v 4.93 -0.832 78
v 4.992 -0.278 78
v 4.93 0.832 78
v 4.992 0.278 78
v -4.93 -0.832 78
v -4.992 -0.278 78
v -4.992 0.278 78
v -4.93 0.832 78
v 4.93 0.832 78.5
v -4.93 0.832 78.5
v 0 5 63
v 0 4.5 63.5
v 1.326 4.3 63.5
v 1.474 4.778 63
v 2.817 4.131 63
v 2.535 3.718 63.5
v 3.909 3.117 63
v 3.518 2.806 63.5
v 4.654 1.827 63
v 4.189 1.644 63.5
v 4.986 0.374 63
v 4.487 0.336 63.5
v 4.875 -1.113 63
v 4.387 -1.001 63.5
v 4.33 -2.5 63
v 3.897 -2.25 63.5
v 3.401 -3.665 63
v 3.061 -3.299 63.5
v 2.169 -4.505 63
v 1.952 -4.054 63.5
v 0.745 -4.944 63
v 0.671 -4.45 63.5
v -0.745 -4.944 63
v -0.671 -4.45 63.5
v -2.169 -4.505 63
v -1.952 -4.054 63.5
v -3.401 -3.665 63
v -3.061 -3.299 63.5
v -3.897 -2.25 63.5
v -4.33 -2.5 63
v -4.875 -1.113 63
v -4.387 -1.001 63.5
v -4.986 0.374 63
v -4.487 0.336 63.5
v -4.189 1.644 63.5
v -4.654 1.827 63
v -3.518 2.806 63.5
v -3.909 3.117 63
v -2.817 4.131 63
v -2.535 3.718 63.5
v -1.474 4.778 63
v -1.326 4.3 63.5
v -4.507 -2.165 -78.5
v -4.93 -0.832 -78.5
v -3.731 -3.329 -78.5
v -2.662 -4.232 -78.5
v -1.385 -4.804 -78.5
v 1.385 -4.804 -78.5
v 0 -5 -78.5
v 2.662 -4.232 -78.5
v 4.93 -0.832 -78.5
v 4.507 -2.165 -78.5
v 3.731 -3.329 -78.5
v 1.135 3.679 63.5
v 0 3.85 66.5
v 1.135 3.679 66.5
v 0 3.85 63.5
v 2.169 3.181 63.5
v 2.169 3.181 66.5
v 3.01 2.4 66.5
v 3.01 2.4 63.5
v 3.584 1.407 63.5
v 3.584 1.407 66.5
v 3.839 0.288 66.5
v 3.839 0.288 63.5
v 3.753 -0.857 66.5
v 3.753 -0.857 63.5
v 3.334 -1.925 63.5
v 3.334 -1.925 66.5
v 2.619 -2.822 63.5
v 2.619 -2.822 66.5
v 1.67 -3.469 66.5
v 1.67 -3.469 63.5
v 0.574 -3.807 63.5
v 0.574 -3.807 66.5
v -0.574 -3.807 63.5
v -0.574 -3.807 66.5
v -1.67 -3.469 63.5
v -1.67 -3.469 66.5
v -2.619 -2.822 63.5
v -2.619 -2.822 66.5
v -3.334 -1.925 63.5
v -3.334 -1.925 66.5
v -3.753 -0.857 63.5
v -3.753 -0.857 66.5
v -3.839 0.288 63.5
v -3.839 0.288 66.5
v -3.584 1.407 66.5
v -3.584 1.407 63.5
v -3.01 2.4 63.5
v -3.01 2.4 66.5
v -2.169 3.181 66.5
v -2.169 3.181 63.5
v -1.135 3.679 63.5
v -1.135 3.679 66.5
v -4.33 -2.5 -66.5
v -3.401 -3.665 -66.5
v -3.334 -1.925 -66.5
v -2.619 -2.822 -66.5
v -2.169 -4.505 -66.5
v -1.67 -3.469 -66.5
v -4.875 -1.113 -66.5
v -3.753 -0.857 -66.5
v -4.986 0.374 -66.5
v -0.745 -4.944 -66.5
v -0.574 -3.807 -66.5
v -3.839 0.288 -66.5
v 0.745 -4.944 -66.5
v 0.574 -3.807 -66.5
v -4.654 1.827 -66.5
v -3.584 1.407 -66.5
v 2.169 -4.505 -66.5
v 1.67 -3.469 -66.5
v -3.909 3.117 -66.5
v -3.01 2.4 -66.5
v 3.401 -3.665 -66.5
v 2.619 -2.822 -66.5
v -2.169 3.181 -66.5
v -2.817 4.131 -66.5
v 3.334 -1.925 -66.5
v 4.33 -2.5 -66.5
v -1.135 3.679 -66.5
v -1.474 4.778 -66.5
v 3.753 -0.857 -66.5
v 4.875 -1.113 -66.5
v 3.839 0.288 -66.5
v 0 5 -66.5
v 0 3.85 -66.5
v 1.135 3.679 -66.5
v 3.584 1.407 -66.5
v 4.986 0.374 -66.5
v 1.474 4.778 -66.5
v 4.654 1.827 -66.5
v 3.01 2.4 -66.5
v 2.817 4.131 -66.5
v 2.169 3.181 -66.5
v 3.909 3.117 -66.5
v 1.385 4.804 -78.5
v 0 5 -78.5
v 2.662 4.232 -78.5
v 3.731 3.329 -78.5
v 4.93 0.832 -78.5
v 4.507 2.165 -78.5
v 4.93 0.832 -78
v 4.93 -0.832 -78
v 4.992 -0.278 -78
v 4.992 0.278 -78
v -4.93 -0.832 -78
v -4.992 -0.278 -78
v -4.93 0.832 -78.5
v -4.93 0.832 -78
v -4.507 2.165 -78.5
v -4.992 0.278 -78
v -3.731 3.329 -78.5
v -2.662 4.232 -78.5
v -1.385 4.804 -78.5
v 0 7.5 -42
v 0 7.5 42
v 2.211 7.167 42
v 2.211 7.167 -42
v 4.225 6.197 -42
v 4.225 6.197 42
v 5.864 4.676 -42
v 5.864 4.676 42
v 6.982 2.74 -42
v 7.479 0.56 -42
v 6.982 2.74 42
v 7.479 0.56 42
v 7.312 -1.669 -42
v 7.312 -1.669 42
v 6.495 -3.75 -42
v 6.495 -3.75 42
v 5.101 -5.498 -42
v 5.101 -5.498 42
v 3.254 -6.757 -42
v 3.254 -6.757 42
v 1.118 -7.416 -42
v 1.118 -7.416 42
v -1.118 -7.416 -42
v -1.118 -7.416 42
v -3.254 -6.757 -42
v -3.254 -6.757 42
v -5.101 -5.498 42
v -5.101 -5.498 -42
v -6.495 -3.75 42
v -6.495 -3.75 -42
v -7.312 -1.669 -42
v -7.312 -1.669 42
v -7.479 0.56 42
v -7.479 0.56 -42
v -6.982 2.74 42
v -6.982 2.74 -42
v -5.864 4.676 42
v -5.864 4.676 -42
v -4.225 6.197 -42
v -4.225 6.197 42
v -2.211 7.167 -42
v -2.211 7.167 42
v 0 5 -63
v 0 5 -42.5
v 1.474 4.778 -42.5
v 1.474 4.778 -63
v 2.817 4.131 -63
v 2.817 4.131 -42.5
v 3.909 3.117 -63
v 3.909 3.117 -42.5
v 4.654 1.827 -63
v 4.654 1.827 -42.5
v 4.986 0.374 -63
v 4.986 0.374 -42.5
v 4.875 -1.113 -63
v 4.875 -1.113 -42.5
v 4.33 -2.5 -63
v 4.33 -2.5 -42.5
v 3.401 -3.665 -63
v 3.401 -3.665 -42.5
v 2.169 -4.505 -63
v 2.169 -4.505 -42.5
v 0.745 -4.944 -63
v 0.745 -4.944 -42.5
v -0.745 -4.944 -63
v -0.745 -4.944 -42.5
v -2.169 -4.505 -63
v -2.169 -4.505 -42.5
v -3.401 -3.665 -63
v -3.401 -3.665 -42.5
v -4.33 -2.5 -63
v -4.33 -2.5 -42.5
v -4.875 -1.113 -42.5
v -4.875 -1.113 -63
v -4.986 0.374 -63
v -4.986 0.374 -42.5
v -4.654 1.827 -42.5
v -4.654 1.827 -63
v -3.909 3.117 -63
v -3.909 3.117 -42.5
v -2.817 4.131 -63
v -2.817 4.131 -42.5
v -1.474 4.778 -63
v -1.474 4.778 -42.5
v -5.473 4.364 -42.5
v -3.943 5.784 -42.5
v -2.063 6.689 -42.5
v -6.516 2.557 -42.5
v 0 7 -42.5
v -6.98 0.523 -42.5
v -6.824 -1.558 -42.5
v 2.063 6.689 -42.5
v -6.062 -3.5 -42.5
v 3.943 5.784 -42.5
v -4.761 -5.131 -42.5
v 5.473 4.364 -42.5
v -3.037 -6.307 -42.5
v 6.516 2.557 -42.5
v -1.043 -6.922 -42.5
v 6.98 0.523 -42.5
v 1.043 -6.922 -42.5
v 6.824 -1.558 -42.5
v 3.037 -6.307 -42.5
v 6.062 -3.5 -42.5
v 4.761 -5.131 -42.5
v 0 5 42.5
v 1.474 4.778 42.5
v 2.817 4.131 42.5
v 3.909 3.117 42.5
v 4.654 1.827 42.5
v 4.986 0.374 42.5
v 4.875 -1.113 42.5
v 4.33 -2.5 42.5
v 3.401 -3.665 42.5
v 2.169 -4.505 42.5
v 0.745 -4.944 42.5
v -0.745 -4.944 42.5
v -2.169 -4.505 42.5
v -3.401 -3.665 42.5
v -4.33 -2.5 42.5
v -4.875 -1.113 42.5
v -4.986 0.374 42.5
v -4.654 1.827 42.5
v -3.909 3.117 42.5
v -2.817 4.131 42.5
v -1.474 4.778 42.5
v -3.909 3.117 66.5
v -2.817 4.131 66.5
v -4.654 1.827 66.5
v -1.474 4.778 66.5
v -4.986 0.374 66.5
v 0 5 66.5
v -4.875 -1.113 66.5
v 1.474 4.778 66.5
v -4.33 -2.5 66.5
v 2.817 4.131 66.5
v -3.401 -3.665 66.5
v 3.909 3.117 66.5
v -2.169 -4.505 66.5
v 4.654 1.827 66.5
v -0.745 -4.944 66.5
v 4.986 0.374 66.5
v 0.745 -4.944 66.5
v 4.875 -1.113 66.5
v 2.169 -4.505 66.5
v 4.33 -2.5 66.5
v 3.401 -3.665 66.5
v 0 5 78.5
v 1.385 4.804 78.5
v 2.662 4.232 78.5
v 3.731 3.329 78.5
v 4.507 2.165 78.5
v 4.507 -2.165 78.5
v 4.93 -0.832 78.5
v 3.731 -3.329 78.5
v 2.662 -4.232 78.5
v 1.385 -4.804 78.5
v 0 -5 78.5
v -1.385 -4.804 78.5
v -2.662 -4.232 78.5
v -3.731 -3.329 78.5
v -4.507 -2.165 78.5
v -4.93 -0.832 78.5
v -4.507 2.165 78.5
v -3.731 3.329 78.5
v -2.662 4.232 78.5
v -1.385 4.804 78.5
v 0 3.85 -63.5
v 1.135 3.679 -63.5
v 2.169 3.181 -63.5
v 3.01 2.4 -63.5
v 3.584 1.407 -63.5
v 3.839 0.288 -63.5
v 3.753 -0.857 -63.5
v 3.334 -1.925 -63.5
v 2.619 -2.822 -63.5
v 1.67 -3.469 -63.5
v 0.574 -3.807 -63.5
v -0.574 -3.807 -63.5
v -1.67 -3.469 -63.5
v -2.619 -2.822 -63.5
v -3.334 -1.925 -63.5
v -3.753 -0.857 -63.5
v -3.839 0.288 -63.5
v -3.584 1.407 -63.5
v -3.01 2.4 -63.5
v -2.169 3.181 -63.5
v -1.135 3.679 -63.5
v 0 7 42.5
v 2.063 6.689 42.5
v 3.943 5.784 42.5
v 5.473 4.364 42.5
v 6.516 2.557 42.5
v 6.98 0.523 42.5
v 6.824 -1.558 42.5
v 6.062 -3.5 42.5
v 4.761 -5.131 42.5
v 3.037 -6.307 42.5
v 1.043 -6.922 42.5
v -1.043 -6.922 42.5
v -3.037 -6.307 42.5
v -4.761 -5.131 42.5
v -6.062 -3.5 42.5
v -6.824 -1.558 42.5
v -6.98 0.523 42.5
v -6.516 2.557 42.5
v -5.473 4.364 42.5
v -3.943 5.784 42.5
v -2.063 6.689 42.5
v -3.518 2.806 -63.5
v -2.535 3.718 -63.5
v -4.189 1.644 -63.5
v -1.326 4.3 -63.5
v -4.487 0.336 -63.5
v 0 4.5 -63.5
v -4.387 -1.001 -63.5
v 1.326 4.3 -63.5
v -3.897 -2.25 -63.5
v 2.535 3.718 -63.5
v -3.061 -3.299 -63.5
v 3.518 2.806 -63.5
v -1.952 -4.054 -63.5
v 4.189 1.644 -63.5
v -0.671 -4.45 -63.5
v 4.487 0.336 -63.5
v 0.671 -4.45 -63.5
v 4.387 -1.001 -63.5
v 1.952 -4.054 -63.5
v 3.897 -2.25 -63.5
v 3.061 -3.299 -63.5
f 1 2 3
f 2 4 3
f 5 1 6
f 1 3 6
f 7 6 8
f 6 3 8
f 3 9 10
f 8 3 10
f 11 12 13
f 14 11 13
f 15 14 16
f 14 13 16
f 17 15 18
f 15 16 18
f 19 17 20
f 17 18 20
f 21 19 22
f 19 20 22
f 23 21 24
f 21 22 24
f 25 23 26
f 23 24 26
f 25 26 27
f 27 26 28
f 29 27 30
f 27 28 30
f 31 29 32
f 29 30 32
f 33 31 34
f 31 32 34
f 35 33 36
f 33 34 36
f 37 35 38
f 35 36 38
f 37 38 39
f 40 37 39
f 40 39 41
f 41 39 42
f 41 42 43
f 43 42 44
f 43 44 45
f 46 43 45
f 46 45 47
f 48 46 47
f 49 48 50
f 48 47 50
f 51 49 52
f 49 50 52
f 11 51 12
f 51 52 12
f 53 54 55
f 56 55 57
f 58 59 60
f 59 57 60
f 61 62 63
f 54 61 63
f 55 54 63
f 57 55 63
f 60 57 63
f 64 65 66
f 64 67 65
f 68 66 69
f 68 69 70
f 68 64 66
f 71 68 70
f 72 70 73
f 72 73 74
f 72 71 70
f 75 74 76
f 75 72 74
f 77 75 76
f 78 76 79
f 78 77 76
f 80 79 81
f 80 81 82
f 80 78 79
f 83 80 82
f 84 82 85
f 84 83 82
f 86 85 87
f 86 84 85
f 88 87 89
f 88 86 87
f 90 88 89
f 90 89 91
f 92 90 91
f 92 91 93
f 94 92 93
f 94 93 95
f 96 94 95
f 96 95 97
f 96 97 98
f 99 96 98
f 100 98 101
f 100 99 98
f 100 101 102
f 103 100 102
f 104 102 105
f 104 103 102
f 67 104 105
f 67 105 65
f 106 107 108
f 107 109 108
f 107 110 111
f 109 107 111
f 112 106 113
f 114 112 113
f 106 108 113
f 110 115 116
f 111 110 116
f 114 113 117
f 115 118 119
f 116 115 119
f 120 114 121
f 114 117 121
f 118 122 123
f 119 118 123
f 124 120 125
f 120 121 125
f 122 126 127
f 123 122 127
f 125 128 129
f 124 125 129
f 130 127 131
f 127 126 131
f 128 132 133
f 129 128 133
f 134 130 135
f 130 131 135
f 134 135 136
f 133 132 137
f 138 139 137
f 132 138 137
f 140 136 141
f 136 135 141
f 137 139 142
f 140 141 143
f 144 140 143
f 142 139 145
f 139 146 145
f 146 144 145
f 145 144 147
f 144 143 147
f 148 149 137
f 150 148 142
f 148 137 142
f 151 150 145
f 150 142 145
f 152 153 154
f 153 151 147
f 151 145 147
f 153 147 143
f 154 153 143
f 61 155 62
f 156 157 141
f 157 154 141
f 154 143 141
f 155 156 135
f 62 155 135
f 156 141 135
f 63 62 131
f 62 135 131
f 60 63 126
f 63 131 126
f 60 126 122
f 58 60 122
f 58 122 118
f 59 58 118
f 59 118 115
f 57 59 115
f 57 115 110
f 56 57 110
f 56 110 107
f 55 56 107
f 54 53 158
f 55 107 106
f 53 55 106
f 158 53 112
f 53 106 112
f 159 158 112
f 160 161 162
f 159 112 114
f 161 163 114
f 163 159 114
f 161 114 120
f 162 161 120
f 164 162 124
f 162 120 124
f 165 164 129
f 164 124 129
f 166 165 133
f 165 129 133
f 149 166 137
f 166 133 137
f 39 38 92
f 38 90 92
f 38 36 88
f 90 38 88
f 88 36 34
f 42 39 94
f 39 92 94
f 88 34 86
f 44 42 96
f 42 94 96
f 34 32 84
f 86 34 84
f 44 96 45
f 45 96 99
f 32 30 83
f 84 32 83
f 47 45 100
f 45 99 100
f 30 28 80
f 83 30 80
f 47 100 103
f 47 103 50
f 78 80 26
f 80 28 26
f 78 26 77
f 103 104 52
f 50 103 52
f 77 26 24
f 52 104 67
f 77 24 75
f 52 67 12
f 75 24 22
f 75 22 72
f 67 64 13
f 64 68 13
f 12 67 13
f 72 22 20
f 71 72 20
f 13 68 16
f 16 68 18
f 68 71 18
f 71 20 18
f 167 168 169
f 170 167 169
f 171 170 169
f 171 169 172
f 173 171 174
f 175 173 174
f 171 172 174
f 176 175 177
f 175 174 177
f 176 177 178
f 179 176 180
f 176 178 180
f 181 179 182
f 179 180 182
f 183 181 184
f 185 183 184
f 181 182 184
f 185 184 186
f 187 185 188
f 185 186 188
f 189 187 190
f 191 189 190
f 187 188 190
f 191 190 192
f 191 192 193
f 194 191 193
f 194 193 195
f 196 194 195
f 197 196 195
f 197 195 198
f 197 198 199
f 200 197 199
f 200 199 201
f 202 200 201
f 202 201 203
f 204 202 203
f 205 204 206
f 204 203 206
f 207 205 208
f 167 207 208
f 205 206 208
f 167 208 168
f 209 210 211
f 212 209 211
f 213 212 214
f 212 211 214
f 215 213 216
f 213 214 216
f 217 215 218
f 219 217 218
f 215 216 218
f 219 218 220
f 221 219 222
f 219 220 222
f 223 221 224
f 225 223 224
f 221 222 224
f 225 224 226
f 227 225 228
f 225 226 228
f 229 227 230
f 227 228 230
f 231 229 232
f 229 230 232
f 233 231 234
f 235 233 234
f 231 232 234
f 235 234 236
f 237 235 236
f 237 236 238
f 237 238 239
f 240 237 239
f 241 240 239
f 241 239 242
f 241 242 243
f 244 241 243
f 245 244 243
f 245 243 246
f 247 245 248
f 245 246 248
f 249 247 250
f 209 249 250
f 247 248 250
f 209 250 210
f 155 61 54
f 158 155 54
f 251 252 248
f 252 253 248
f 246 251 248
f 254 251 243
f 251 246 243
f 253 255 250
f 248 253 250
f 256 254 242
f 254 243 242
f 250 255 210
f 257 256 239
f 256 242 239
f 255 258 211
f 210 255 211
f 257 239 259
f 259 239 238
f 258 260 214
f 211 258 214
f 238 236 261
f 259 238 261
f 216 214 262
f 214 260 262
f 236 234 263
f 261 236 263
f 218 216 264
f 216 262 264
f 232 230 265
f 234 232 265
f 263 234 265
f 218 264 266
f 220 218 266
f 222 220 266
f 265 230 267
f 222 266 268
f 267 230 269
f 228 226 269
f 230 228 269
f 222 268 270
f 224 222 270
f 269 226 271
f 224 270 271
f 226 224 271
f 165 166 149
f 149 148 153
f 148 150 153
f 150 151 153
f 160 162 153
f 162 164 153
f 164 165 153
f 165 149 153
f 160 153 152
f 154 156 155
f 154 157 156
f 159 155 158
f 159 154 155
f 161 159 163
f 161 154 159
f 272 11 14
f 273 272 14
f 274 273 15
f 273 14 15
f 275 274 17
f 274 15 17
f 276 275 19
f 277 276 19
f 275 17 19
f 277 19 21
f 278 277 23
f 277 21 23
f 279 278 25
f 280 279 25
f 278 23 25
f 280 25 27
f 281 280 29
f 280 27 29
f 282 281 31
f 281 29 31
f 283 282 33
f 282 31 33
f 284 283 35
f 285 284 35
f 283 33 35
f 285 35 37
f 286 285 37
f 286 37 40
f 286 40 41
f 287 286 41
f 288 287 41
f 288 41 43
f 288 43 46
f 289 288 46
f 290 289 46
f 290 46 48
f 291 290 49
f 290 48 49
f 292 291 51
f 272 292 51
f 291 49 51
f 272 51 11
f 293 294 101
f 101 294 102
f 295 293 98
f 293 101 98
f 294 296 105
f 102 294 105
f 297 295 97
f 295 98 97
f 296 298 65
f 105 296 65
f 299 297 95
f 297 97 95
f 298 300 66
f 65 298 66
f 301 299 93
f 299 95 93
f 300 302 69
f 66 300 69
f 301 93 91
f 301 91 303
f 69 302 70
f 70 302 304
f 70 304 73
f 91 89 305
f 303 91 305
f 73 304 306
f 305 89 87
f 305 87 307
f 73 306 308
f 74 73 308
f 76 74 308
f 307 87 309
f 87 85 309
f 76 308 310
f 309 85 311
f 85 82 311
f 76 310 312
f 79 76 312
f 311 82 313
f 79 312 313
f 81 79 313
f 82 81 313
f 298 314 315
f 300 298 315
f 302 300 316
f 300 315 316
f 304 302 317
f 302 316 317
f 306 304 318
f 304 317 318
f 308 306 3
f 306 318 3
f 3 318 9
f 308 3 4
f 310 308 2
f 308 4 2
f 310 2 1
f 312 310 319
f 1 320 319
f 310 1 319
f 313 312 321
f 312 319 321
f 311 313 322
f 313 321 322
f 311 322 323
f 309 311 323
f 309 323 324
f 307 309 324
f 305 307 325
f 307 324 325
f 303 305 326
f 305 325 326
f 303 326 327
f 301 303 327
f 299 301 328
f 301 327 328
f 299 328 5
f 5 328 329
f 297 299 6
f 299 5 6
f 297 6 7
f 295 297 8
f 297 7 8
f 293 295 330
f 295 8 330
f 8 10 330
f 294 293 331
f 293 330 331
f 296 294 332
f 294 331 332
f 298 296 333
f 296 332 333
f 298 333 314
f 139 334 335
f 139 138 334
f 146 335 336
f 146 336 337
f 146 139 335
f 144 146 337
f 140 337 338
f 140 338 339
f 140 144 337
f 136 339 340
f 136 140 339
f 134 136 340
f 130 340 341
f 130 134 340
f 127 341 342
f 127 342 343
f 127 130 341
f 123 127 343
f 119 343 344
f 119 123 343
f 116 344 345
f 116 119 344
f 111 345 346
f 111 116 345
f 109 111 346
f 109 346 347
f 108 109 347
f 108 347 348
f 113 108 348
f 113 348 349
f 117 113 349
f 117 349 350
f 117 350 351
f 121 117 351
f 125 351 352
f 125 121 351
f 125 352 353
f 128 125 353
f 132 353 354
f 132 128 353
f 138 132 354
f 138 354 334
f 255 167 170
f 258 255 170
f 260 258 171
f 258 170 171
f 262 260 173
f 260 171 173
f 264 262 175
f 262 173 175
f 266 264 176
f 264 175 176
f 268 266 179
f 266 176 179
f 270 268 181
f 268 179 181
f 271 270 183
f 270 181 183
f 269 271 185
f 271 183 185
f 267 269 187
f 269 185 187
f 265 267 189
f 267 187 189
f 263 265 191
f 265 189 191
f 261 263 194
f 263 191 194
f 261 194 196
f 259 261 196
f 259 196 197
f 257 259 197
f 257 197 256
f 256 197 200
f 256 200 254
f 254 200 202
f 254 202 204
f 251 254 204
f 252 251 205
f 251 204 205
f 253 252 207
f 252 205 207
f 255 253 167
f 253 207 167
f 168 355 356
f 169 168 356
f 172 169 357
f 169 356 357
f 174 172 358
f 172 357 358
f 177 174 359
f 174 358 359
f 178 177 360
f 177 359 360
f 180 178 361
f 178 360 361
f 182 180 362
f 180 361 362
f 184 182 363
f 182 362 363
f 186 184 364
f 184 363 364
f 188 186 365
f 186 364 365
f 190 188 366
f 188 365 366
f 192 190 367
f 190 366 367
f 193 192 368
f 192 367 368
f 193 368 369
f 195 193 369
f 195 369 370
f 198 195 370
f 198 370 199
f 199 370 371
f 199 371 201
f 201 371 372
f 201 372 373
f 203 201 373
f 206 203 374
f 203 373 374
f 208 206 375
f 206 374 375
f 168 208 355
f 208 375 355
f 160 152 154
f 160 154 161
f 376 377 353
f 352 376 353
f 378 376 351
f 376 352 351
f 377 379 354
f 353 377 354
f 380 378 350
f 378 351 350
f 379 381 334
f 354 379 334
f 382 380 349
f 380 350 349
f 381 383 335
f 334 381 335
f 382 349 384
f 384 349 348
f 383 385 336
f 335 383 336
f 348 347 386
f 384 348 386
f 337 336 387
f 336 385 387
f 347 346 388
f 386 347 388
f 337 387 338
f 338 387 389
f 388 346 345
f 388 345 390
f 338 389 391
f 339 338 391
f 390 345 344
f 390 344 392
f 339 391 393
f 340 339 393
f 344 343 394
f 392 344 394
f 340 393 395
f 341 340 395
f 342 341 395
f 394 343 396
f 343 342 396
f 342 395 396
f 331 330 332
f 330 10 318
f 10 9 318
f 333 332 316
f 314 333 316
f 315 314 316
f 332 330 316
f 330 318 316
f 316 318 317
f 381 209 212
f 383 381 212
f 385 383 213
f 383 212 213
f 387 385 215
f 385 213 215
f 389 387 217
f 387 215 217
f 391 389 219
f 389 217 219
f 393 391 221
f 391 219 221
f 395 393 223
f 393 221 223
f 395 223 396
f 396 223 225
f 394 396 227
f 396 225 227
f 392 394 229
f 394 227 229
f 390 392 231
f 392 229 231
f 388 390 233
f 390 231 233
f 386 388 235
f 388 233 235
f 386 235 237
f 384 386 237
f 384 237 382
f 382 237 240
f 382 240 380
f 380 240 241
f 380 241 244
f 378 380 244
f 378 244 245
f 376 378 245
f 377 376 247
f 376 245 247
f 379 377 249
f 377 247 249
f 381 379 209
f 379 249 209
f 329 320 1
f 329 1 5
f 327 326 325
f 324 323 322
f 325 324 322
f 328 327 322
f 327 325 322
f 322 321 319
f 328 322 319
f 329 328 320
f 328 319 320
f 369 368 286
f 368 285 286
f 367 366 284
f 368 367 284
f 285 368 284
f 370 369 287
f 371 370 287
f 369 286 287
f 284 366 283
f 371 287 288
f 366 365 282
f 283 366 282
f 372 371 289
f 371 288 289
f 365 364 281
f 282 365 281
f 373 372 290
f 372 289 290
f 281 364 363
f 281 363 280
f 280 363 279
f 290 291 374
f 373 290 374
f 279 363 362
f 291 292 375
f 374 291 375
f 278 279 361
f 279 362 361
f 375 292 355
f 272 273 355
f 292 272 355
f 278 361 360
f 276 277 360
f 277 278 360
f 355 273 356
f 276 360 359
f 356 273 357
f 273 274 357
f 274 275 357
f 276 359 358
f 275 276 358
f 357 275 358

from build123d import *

# Parameters (mm, degrees)
ESQUISSE2_W             = 3
ESQUISSE2_H             = 3.85
CHANFREIN1_SIZE         = 0.5
ESQUISSE4_W             = 11.666620124
ESQUISSE4_H             = 1.663113932
ENL_V_MAT_EXTRU_2_DEPTH = 0.5


with BuildPart() as part:
    # Esquisse2 → Révolution1 (revolve)
    with BuildSketch(Plane(origin=(0, 0, 0), x_dir=(0, 0, -1), z_dir=(1, 0, 0))):
        Polygon((-78.5, 0), (-66.5, 0), (-66.5, 3.85), (-66.5, 5), (-78.5, 5), align=None)
        with Locations((-65, 1.925)):
            Rectangle(ESQUISSE2_W, ESQUISSE2_H)
        Polygon((-63.5, 3.85), (-63.5, 0), (-42.5, 0), (-42.5, 5), (-63.5, 5), align=None)
        Polygon((-42.5, 5), (-42.5, 0), (0, 0), (0, 7.5), (-42.5, 7.5), align=None)
        Polygon((0, 7.5), (0, 0), (42.5, 0), (42.5, 5), (42.5, 7.5), align=None)
        Polygon((42.5, 5), (42.5, 0), (63.5, 0), (63.5, 3.85), (63.5, 5), align=None)
        with Locations((65, 1.925)):
            Rectangle(ESQUISSE2_W, ESQUISSE2_H)
        Polygon((66.5, 3.85), (66.5, 0), (78.5, 0), (78.5, 5), (66.5, 5), align=None)
    revolve(axis=Axis((0, 0, 42.5), (0, 0, -1)))

    # Chanfrein1
    chanfrein1_edges = [part.edges().sort_by_distance(p)[0] for p in [
        (0, -5, 63.5),
        (0, -7.5, 42.5),
        (0, -7.5, -42.5),
        (0, -5, -63.5),
    ]]
    chamfer(chanfrein1_edges, length=CHANFREIN1_SIZE)

    # Esquisse4 → Enlèv. mat.-Extru.2 (cut)
    with BuildSketch(Plane(origin=(0, 0, -78.5), x_dir=(-1, 0, 0), z_dir=(0, 0, -1))):
        Rectangle(ESQUISSE4_W, ESQUISSE4_H)
    enl_v_mat_extru_2 = extrude(amount=-ENL_V_MAT_EXTRU_2_DEPTH, mode=Mode.SUBTRACT)

    # Symétrie2: Enlèv. mat.-Extru.2 across plane
    add(enl_v_mat_extru_2.mirror(Plane.XY), mode=Mode.SUBTRACT)


solid = part.part
